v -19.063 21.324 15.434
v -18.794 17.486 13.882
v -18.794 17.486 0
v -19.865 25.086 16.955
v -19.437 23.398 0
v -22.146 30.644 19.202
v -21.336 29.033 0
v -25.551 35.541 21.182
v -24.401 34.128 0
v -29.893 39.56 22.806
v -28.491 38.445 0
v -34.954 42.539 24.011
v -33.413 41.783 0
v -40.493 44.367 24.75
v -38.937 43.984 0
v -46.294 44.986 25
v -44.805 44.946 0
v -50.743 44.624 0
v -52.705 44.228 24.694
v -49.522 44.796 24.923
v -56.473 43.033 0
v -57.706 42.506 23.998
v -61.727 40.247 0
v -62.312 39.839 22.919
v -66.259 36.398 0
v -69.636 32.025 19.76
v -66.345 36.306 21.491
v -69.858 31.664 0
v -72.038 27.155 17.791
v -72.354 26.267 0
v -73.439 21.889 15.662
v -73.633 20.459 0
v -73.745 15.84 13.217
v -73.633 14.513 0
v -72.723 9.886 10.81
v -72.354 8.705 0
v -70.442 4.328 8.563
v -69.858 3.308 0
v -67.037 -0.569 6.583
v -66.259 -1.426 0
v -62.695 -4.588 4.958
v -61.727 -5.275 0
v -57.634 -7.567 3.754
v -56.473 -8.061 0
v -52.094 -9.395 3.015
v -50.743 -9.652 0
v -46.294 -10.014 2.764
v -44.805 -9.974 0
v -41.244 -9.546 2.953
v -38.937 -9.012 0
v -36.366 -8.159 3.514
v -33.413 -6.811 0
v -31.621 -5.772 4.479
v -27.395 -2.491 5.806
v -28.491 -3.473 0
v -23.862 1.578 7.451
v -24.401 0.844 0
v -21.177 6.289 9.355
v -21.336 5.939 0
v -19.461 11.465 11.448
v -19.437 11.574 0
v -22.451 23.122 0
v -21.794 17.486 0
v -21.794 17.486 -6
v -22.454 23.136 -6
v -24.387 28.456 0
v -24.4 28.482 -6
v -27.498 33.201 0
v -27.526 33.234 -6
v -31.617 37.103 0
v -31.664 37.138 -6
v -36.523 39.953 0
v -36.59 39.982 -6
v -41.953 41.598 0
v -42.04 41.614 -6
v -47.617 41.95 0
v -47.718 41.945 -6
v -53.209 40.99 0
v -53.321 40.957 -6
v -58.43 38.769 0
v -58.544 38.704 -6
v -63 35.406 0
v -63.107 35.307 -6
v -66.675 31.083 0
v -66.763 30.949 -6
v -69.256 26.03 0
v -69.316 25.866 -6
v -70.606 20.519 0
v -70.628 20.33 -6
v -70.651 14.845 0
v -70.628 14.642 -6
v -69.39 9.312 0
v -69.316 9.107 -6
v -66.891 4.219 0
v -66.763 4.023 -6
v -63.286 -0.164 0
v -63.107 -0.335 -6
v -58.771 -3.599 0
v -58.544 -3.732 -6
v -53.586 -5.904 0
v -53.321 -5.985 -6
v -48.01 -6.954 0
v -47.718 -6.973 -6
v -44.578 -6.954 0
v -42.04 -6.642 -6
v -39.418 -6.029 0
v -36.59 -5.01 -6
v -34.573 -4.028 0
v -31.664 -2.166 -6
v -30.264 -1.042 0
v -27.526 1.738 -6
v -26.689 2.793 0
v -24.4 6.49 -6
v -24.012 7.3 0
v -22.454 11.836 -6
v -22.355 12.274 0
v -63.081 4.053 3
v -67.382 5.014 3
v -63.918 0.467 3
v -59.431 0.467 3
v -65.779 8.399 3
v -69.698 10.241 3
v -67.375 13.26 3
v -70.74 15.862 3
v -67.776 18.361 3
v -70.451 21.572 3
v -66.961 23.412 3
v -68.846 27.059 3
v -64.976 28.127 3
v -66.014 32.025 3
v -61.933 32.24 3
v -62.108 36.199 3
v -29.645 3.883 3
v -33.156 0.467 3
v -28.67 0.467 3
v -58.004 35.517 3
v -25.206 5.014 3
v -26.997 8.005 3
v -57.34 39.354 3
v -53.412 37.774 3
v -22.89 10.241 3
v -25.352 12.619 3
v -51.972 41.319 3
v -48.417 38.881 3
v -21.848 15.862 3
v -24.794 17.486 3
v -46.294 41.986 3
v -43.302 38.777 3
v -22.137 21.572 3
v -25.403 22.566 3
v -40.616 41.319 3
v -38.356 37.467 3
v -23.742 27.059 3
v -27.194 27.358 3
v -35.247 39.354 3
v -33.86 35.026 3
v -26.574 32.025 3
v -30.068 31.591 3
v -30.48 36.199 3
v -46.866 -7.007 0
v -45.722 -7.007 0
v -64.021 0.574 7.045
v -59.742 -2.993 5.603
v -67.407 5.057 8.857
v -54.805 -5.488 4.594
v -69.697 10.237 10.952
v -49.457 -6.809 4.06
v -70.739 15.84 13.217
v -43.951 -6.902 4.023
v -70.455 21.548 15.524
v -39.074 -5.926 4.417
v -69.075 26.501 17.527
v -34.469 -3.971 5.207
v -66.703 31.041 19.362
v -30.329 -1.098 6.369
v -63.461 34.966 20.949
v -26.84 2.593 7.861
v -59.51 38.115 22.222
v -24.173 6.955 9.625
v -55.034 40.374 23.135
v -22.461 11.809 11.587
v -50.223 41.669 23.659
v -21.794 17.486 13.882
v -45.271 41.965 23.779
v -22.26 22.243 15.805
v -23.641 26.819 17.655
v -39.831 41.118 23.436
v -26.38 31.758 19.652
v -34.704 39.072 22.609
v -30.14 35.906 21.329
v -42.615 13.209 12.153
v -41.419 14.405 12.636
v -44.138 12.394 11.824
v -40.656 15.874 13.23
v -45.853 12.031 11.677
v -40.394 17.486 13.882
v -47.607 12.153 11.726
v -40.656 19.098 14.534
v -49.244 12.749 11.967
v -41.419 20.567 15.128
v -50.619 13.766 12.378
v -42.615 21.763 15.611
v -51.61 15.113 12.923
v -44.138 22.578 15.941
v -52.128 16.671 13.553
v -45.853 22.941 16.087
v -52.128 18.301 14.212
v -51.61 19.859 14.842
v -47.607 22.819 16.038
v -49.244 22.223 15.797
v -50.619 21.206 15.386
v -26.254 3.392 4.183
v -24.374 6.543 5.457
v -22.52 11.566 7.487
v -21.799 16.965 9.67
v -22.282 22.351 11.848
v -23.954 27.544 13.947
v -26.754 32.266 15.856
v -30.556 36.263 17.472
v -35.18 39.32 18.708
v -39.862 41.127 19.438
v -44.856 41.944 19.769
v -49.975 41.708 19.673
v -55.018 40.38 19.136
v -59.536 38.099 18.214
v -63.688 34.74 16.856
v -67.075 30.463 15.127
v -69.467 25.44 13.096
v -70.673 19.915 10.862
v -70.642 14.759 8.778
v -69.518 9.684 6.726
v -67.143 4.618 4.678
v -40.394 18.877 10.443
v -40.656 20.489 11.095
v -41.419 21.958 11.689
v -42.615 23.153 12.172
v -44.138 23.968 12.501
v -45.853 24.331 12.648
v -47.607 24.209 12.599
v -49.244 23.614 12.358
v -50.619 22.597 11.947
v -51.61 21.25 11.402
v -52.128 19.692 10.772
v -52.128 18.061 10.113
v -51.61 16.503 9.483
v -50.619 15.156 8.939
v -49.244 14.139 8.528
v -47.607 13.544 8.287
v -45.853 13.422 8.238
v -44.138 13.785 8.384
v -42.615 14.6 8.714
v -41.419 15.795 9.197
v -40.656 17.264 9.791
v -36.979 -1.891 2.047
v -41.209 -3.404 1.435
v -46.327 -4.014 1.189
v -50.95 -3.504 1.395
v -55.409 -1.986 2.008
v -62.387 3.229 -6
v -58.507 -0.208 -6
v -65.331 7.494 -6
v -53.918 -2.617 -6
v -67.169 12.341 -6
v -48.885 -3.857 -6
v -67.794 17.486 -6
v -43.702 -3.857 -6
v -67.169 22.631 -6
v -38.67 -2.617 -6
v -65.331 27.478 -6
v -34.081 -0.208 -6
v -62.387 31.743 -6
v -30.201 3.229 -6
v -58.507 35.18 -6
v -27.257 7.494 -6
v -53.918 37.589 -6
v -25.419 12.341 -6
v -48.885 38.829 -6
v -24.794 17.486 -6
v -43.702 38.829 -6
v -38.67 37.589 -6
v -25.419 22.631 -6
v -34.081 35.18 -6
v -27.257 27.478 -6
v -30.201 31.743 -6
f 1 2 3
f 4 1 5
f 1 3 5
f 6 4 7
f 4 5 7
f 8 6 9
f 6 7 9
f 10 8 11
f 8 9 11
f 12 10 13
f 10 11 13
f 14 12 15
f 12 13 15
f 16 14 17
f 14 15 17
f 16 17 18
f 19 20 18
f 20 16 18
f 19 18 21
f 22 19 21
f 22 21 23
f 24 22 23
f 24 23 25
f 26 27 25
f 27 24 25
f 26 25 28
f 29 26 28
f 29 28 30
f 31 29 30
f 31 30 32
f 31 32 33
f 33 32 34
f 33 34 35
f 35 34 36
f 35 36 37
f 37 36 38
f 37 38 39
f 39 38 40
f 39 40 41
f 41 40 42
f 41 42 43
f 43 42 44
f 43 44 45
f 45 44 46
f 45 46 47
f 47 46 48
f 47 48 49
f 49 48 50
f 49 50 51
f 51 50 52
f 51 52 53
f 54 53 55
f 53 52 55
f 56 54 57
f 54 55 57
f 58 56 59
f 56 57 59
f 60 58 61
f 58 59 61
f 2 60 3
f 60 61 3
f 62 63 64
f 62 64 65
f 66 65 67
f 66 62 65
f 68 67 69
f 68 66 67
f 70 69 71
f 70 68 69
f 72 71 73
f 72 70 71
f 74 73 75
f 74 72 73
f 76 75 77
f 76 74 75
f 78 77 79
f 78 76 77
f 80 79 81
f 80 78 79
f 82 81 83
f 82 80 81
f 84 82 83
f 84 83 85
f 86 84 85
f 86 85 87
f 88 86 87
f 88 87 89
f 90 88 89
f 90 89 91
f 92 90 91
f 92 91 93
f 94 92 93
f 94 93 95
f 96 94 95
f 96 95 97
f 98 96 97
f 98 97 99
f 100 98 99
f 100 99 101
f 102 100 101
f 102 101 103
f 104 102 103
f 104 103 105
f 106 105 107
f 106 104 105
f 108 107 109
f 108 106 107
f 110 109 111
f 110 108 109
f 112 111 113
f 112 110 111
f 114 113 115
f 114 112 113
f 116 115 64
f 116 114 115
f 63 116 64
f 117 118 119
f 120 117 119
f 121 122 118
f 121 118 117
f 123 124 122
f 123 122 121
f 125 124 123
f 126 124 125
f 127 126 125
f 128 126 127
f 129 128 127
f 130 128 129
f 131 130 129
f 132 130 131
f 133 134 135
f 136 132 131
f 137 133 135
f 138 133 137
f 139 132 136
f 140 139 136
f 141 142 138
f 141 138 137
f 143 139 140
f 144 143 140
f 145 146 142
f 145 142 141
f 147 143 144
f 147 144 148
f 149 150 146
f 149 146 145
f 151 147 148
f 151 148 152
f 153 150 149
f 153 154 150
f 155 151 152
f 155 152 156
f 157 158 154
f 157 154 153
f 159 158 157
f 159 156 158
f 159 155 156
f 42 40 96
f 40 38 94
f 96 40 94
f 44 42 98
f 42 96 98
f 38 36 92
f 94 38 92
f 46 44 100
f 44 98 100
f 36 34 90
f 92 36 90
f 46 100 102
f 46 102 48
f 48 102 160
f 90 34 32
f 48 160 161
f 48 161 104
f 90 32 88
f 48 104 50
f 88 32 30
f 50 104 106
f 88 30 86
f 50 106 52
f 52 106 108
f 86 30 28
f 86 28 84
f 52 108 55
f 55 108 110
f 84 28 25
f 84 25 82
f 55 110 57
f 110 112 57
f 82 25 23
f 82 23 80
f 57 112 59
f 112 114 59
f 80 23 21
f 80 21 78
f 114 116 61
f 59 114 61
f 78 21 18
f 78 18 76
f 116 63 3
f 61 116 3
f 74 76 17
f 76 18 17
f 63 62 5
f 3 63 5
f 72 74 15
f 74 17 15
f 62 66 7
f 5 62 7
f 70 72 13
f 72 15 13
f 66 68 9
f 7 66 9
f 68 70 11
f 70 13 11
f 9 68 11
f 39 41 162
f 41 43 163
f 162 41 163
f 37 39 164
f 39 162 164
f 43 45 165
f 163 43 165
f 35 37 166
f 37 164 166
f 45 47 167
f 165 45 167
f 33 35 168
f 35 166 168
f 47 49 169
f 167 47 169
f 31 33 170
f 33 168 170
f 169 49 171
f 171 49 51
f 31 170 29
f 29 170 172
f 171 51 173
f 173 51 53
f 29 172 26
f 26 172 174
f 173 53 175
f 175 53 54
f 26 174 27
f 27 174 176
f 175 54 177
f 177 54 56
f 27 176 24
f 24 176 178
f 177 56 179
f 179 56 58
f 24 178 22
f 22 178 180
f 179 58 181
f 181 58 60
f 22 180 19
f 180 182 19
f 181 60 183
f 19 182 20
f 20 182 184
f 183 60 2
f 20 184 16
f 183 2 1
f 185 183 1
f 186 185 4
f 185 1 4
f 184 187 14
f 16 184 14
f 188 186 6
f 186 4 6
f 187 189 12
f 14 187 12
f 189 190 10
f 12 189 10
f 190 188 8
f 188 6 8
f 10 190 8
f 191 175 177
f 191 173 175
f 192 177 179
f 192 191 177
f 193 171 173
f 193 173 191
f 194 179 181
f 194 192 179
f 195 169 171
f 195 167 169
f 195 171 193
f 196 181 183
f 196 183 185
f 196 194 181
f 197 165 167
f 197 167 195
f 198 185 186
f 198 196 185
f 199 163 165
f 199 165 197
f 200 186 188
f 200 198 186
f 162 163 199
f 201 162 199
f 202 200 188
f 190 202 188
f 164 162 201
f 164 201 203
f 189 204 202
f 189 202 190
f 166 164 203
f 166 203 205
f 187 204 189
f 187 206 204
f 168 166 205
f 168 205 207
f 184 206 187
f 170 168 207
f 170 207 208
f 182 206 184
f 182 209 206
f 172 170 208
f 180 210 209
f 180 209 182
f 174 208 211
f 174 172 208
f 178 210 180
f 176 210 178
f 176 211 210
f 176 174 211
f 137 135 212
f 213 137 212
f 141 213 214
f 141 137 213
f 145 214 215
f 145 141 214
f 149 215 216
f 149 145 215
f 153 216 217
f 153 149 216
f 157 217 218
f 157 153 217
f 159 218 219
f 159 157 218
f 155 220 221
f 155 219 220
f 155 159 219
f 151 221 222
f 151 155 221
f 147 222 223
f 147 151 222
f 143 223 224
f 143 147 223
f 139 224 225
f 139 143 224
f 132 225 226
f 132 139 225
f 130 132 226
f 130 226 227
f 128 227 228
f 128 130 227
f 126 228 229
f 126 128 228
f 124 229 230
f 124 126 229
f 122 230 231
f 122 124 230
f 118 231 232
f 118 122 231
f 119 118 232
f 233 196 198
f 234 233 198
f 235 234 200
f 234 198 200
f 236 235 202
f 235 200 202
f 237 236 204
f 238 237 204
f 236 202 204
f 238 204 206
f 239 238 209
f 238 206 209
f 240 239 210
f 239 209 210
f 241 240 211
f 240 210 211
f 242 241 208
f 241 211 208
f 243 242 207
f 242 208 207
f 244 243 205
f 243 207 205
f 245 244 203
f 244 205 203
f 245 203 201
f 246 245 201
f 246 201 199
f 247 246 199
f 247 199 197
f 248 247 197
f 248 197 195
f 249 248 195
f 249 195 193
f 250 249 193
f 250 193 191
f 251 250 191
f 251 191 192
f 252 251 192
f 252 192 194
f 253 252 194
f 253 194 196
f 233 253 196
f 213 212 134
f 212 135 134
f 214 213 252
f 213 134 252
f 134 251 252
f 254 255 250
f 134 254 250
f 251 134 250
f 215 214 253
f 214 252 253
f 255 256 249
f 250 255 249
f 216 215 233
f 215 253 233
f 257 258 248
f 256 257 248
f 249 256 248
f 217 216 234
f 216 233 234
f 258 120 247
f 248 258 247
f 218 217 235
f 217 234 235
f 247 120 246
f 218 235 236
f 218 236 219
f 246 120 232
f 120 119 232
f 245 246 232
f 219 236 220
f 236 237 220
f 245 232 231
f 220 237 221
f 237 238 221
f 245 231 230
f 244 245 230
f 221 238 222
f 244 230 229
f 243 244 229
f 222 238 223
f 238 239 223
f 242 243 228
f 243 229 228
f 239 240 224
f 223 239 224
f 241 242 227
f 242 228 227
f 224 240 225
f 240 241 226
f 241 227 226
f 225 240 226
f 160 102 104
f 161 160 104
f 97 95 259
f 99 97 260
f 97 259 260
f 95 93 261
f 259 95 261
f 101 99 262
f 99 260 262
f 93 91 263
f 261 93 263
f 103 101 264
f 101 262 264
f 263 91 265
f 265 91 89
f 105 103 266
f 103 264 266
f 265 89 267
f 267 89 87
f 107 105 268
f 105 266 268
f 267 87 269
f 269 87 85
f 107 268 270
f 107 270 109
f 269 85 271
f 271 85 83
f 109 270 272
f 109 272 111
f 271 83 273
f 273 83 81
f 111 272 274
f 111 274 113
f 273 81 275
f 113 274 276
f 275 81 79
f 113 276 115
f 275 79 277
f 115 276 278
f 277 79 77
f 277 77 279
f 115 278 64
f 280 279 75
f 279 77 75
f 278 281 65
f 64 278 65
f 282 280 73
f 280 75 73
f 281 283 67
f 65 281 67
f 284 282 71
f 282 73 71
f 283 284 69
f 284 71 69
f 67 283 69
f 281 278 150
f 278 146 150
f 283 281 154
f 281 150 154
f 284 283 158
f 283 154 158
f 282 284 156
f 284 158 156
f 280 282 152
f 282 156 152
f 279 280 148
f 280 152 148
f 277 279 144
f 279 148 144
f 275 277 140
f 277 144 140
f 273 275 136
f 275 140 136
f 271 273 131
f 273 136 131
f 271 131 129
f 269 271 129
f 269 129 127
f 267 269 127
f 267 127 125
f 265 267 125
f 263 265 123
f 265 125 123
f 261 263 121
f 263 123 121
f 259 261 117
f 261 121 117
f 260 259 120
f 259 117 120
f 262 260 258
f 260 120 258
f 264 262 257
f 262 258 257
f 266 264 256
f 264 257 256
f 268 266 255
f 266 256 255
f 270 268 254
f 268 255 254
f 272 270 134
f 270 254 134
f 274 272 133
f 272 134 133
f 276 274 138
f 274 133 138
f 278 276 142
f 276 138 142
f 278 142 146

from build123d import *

# Parameters (mm, degrees)
F0_R      = 27.5
F0_R_2    = 24.5
F1_DEPTH  = 25
F3_DEPTH  = 82.3
F0_R_3    = 21.5
F7_DEPTH  = 3
F8_DEPTH  = 6
F9_R      = 5.9
F10_DEPTH = 12.8


with BuildPart() as f1:
    # F0 (on Top) → F1 (new body)
    with BuildSketch(Plane.XY):
        with Locations((-46.2939329445, 17.4860227853)):
            Circle(F0_R)
        with Locations((-46.2939329445, 17.4860227853)):
            Circle(F0_R_2, mode=Mode.SUBTRACT)
    extrude(amount=F1_DEPTH)

    # F2 (on Right) → F3 (cut)
    with BuildSketch(Plane.YZ):
        Polygon((44.9860227853, 25), (-10.0139772147, 25), (-10.0139772147, 2.7644119691), align=None)
    extrude(amount=-F3_DEPTH, mode=Mode.SUBTRACT)

    # F6: sweep along a path in F5
    with BuildLine(Plane.XZ) as f6_path:
        Line((-46.2939329445, 4.0015787818), (-46.2939329445, 0))
    # F4 (on face) → F6 (sweep)
    with BuildSketch(Plane(origin=(0, -2.3674011747, 5.8557958722), x_dir=(1, 0, 0), z_dir=(0, -0.3748115672, 0.9271010134))):
        with BuildLine():
            add(Edge.make_bspline(
                [(-21.7939329445, 21.4145208265), (-21.7939329445, -24.3574545801), (-58.5439329445, -1.4714668768), (-95.2939329445, 21.4145208265), (-58.5439329445, 44.3005085297), (-21.7939329445, 67.186496233), (-21.7939329445, 21.4145208265)],
                knots=[4.7123889804, 4.7123889804, 4.7123889804, 6.8067840828, 6.8067840828, 8.9011791852, 8.9011791852, 10.9955742876, 10.9955742876, 10.9955742876], degree=2, weights=[1, 0.5, 1, 0.5, 1, 0.5, 1]))
        make_face()
    sweep(path=f6_path.line)

    # F0 (on Top) → F7 (join)
    with BuildSketch(Plane.XY):
        with Locations((-46.2939329445, 17.4860227853)):
            Circle(F0_R_2)
        with Locations((-46.2939329445, 17.4860227853)):
            Circle(F0_R_3, mode=Mode.SUBTRACT)
    extrude(amount=F7_DEPTH)

    # F0 (on Top) → F8 (join)
    with BuildSketch(Plane.XY):
        with Locations((-46.2939329445, 17.4860227853)):
            Circle(F0_R_2)
        with Locations((-46.2939329445, 17.4860227853)):
            Circle(F0_R_3, mode=Mode.SUBTRACT)
    extrude(amount=-F8_DEPTH)

    # F9 (on face) → F10 (cut)
    with BuildSketch(Plane(origin=(0, -2.3674011747, 5.8557958722), x_dir=(1, 0, 0), z_dir=(0, -0.3748115672, 0.9271010134))):
        with Locations((-46.2939329445, 21.4145208265)):
            Circle(F9_R)
    extrude(amount=-F10_DEPTH, mode=Mode.SUBTRACT)


solid = f1.part
